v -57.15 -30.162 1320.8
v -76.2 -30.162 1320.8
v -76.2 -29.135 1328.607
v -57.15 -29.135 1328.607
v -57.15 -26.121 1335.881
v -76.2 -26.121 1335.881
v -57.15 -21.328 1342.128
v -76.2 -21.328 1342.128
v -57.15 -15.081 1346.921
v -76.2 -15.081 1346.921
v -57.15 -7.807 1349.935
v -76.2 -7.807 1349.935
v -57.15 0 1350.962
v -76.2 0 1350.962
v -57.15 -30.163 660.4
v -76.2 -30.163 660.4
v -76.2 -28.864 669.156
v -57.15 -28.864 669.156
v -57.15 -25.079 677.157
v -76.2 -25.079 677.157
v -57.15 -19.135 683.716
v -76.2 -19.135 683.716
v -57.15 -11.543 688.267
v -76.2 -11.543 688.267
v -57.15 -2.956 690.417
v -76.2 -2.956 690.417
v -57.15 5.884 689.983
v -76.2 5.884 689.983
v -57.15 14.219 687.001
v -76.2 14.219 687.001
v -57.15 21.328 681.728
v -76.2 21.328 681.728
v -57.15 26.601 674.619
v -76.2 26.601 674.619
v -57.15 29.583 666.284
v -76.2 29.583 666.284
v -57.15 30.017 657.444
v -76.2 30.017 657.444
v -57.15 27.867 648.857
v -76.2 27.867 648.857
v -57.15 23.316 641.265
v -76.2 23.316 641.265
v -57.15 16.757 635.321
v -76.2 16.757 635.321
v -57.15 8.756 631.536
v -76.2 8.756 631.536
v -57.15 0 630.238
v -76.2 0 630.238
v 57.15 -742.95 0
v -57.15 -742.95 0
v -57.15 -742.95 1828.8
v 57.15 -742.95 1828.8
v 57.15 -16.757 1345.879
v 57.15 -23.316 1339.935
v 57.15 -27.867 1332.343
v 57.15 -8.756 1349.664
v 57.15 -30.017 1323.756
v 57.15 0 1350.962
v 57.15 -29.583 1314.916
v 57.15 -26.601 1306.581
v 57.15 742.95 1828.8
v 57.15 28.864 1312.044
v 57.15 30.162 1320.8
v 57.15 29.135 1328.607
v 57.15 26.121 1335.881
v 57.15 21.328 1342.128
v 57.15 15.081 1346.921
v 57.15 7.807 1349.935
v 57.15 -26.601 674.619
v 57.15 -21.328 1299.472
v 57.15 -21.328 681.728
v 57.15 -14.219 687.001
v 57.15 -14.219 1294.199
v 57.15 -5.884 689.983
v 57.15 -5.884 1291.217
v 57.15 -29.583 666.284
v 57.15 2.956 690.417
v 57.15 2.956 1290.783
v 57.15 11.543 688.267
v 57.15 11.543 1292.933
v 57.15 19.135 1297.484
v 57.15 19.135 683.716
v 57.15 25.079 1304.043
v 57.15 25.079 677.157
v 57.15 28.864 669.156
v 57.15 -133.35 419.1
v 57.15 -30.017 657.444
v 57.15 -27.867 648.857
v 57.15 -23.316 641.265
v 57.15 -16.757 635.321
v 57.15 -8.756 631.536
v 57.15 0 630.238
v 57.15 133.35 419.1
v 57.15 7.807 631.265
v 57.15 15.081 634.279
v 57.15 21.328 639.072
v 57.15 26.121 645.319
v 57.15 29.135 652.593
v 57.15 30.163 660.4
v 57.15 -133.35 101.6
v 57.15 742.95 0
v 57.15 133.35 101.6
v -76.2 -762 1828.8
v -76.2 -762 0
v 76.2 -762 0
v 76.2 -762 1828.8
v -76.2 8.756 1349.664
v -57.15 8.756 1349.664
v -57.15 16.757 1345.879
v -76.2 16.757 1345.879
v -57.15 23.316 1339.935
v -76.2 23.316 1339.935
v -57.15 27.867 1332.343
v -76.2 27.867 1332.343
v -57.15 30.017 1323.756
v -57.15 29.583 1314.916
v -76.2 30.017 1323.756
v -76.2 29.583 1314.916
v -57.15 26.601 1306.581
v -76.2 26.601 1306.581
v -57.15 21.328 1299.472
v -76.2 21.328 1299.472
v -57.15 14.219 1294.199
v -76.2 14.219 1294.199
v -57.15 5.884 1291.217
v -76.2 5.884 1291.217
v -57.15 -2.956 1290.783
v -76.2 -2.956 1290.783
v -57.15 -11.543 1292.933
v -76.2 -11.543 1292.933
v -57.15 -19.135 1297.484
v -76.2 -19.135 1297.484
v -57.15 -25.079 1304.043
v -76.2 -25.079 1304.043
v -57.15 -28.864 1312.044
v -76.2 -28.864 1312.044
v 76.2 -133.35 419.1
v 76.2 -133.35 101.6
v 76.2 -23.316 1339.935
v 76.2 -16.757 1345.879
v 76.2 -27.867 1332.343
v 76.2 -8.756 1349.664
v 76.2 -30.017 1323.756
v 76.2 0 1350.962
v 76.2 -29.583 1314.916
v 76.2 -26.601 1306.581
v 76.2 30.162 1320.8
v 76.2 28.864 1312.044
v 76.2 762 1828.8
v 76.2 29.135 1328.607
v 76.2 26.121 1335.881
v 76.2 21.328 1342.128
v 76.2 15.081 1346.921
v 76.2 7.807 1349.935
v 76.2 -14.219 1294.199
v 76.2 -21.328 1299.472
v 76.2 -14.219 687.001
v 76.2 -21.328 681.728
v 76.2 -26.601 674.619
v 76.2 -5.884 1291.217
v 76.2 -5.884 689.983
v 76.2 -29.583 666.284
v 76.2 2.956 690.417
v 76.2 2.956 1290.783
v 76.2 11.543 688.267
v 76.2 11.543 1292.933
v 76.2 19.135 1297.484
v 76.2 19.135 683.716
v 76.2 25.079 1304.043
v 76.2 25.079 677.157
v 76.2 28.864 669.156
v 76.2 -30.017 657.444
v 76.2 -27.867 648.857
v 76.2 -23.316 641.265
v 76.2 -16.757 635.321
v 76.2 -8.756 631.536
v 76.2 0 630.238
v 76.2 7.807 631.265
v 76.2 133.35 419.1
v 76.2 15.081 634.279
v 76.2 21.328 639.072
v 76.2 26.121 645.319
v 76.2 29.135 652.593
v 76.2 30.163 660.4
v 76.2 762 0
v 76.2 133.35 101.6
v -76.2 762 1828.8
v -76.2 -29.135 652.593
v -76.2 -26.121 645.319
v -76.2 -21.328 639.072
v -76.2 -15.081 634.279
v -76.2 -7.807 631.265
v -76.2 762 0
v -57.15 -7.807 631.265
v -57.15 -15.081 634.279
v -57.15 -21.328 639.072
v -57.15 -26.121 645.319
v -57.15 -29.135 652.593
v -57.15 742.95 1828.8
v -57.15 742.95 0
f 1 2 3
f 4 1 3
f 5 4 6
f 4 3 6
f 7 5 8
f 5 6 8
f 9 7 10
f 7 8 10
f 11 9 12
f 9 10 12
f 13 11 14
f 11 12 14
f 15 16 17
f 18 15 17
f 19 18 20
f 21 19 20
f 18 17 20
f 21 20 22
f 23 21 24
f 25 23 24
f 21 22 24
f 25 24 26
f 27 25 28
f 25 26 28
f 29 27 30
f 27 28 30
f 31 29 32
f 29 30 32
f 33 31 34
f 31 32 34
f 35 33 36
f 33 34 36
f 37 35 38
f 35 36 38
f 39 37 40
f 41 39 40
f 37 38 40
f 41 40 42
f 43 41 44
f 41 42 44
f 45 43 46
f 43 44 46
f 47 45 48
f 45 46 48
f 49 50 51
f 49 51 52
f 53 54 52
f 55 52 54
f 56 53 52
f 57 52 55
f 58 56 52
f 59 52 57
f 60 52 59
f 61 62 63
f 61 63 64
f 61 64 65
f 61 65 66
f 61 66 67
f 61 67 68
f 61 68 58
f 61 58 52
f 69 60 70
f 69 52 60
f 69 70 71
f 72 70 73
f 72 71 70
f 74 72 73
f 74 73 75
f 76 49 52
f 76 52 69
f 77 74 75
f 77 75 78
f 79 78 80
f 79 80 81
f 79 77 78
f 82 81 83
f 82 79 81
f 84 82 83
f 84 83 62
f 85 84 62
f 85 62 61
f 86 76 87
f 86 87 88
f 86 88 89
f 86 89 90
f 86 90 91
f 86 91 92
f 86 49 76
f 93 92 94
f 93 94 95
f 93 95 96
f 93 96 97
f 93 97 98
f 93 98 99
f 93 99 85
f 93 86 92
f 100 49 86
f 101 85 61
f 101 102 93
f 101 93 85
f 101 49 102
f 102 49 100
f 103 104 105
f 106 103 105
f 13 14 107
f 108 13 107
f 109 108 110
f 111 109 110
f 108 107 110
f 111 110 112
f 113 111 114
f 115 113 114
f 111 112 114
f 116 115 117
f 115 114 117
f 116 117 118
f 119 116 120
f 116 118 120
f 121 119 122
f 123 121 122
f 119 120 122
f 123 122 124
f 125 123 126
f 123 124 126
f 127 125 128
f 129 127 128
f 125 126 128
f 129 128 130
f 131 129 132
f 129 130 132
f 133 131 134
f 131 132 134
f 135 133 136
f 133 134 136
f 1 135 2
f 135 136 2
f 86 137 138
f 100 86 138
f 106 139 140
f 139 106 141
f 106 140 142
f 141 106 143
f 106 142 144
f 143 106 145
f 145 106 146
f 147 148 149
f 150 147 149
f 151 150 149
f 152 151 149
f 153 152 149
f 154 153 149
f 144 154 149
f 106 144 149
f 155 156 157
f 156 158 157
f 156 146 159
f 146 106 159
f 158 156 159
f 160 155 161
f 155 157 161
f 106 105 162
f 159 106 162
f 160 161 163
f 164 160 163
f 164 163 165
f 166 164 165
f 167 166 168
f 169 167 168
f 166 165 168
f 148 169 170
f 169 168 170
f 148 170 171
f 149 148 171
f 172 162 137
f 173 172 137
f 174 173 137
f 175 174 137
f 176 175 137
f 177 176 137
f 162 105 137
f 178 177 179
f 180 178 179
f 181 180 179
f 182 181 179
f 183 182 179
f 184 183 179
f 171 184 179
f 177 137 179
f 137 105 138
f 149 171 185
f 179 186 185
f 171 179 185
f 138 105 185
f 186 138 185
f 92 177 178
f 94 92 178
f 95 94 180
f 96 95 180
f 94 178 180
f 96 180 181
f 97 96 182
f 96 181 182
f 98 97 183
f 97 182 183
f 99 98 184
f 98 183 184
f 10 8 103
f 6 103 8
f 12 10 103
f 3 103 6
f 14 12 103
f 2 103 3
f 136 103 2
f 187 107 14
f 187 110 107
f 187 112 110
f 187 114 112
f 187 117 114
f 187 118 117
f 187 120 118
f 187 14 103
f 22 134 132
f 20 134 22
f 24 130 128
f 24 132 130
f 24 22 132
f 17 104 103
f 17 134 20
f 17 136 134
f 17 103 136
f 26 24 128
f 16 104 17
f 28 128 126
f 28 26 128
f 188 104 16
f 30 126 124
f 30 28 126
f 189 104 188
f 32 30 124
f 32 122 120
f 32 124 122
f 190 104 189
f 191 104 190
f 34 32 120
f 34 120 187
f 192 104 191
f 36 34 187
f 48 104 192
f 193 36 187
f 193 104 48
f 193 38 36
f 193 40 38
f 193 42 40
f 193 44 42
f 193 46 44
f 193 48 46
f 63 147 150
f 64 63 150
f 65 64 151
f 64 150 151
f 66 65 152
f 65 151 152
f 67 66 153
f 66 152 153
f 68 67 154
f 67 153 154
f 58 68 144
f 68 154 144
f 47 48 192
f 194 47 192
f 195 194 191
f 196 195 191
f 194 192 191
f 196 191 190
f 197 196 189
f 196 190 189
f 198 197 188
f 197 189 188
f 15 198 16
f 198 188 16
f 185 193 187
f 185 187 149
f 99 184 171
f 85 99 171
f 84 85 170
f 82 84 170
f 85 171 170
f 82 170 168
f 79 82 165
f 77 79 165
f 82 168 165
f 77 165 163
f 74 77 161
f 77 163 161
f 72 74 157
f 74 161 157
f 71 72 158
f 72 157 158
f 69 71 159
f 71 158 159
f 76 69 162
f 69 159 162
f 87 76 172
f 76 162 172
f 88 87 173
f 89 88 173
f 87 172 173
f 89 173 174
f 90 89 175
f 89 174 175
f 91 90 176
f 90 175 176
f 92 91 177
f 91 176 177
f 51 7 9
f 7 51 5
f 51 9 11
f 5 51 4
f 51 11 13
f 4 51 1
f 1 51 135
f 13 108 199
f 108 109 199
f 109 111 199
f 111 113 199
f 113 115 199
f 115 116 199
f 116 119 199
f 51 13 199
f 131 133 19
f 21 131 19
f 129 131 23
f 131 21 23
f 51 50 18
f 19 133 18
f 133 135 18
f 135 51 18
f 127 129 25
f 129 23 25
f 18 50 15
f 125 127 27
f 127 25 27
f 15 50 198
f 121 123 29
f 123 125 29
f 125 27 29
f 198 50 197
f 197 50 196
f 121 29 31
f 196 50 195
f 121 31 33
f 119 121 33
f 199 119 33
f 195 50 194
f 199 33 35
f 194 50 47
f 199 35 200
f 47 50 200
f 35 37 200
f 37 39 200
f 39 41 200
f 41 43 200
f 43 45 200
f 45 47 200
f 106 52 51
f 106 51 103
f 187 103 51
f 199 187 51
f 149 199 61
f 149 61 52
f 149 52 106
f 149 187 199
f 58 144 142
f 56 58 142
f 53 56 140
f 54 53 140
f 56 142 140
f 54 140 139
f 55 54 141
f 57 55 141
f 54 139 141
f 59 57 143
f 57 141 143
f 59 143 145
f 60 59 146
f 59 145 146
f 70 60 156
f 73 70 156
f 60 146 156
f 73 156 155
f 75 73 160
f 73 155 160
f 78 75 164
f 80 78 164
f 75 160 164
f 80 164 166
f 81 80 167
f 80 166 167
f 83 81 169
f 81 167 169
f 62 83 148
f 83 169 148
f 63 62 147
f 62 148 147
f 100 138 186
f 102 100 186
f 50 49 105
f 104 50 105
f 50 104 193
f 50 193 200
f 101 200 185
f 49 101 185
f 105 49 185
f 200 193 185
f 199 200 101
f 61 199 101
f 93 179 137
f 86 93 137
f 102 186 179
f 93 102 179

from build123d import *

# Parameters (mm, degrees)
F0_W     = 152.4
F0_H     = 1524
F0_W_2   = 114.3
F0_H_2   = 1485.9
F1_DEPTH = 1828.8
F3_DEPTH = 25.4
F5_DEPTH = 25.4


with BuildPart() as f1:
    # F0 (on Top) → F1 (new body)
    with BuildSketch(Plane.XY):
        Rectangle(F0_W, F0_H)
        Rectangle(F0_W_2, F0_H_2, mode=Mode.SUBTRACT)
    extrude(amount=F1_DEPTH)

    # F2 (on face) → F3 (cut)
    with BuildSketch(Plane.YZ.offset(76.2)):
        Polygon((-133.35, 101.6), (0, 101.6), (0, 260.35), (0, 419.1), (-133.35, 419.1), align=None)
        Polygon((0, 260.35), (0, 101.6), (133.35, 101.6), (133.35, 419.1), (0, 419.1), align=None)
        with BuildLine():
            ThreePointArc((30.1625, 660.4), (-21.328108, 681.728108), (0, 630.2375))
            ThreePointArc((0, 630.2375), (21.328108, 639.071892), (30.1625, 660.4))
        make_face()
        with BuildLine():
            ThreePointArc((30.1625, 1320.8), (21.328108, 1342.128108), (0, 1350.9625))
            ThreePointArc((0, 1350.9625), (-21.328108, 1299.471892), (30.1625, 1320.8))
        make_face()
    extrude(amount=-F3_DEPTH, mode=Mode.SUBTRACT)

    # F4 (on face) → F5 (cut)
    with BuildSketch(Plane(origin=(-76.2, 0, 0), x_dir=(0, -1, 0), z_dir=(-1, 0, 0))):
        with BuildLine():
            ThreePointArc((30.1625, 1320.8), (21.328108, 1342.128108), (0, 1350.9625))
            ThreePointArc((0, 1350.9625), (-21.328108, 1299.471892), (30.1625, 1320.8))
        make_face()
        with BuildLine():
            ThreePointArc((30.1625, 660.4), (-21.328108, 681.728108), (0, 630.2375))
            ThreePointArc((0, 630.2375), (21.328108, 639.071892), (30.1625, 660.4))
        make_face()
    extrude(amount=-F5_DEPTH, mode=Mode.SUBTRACT)


solid = f1.part
